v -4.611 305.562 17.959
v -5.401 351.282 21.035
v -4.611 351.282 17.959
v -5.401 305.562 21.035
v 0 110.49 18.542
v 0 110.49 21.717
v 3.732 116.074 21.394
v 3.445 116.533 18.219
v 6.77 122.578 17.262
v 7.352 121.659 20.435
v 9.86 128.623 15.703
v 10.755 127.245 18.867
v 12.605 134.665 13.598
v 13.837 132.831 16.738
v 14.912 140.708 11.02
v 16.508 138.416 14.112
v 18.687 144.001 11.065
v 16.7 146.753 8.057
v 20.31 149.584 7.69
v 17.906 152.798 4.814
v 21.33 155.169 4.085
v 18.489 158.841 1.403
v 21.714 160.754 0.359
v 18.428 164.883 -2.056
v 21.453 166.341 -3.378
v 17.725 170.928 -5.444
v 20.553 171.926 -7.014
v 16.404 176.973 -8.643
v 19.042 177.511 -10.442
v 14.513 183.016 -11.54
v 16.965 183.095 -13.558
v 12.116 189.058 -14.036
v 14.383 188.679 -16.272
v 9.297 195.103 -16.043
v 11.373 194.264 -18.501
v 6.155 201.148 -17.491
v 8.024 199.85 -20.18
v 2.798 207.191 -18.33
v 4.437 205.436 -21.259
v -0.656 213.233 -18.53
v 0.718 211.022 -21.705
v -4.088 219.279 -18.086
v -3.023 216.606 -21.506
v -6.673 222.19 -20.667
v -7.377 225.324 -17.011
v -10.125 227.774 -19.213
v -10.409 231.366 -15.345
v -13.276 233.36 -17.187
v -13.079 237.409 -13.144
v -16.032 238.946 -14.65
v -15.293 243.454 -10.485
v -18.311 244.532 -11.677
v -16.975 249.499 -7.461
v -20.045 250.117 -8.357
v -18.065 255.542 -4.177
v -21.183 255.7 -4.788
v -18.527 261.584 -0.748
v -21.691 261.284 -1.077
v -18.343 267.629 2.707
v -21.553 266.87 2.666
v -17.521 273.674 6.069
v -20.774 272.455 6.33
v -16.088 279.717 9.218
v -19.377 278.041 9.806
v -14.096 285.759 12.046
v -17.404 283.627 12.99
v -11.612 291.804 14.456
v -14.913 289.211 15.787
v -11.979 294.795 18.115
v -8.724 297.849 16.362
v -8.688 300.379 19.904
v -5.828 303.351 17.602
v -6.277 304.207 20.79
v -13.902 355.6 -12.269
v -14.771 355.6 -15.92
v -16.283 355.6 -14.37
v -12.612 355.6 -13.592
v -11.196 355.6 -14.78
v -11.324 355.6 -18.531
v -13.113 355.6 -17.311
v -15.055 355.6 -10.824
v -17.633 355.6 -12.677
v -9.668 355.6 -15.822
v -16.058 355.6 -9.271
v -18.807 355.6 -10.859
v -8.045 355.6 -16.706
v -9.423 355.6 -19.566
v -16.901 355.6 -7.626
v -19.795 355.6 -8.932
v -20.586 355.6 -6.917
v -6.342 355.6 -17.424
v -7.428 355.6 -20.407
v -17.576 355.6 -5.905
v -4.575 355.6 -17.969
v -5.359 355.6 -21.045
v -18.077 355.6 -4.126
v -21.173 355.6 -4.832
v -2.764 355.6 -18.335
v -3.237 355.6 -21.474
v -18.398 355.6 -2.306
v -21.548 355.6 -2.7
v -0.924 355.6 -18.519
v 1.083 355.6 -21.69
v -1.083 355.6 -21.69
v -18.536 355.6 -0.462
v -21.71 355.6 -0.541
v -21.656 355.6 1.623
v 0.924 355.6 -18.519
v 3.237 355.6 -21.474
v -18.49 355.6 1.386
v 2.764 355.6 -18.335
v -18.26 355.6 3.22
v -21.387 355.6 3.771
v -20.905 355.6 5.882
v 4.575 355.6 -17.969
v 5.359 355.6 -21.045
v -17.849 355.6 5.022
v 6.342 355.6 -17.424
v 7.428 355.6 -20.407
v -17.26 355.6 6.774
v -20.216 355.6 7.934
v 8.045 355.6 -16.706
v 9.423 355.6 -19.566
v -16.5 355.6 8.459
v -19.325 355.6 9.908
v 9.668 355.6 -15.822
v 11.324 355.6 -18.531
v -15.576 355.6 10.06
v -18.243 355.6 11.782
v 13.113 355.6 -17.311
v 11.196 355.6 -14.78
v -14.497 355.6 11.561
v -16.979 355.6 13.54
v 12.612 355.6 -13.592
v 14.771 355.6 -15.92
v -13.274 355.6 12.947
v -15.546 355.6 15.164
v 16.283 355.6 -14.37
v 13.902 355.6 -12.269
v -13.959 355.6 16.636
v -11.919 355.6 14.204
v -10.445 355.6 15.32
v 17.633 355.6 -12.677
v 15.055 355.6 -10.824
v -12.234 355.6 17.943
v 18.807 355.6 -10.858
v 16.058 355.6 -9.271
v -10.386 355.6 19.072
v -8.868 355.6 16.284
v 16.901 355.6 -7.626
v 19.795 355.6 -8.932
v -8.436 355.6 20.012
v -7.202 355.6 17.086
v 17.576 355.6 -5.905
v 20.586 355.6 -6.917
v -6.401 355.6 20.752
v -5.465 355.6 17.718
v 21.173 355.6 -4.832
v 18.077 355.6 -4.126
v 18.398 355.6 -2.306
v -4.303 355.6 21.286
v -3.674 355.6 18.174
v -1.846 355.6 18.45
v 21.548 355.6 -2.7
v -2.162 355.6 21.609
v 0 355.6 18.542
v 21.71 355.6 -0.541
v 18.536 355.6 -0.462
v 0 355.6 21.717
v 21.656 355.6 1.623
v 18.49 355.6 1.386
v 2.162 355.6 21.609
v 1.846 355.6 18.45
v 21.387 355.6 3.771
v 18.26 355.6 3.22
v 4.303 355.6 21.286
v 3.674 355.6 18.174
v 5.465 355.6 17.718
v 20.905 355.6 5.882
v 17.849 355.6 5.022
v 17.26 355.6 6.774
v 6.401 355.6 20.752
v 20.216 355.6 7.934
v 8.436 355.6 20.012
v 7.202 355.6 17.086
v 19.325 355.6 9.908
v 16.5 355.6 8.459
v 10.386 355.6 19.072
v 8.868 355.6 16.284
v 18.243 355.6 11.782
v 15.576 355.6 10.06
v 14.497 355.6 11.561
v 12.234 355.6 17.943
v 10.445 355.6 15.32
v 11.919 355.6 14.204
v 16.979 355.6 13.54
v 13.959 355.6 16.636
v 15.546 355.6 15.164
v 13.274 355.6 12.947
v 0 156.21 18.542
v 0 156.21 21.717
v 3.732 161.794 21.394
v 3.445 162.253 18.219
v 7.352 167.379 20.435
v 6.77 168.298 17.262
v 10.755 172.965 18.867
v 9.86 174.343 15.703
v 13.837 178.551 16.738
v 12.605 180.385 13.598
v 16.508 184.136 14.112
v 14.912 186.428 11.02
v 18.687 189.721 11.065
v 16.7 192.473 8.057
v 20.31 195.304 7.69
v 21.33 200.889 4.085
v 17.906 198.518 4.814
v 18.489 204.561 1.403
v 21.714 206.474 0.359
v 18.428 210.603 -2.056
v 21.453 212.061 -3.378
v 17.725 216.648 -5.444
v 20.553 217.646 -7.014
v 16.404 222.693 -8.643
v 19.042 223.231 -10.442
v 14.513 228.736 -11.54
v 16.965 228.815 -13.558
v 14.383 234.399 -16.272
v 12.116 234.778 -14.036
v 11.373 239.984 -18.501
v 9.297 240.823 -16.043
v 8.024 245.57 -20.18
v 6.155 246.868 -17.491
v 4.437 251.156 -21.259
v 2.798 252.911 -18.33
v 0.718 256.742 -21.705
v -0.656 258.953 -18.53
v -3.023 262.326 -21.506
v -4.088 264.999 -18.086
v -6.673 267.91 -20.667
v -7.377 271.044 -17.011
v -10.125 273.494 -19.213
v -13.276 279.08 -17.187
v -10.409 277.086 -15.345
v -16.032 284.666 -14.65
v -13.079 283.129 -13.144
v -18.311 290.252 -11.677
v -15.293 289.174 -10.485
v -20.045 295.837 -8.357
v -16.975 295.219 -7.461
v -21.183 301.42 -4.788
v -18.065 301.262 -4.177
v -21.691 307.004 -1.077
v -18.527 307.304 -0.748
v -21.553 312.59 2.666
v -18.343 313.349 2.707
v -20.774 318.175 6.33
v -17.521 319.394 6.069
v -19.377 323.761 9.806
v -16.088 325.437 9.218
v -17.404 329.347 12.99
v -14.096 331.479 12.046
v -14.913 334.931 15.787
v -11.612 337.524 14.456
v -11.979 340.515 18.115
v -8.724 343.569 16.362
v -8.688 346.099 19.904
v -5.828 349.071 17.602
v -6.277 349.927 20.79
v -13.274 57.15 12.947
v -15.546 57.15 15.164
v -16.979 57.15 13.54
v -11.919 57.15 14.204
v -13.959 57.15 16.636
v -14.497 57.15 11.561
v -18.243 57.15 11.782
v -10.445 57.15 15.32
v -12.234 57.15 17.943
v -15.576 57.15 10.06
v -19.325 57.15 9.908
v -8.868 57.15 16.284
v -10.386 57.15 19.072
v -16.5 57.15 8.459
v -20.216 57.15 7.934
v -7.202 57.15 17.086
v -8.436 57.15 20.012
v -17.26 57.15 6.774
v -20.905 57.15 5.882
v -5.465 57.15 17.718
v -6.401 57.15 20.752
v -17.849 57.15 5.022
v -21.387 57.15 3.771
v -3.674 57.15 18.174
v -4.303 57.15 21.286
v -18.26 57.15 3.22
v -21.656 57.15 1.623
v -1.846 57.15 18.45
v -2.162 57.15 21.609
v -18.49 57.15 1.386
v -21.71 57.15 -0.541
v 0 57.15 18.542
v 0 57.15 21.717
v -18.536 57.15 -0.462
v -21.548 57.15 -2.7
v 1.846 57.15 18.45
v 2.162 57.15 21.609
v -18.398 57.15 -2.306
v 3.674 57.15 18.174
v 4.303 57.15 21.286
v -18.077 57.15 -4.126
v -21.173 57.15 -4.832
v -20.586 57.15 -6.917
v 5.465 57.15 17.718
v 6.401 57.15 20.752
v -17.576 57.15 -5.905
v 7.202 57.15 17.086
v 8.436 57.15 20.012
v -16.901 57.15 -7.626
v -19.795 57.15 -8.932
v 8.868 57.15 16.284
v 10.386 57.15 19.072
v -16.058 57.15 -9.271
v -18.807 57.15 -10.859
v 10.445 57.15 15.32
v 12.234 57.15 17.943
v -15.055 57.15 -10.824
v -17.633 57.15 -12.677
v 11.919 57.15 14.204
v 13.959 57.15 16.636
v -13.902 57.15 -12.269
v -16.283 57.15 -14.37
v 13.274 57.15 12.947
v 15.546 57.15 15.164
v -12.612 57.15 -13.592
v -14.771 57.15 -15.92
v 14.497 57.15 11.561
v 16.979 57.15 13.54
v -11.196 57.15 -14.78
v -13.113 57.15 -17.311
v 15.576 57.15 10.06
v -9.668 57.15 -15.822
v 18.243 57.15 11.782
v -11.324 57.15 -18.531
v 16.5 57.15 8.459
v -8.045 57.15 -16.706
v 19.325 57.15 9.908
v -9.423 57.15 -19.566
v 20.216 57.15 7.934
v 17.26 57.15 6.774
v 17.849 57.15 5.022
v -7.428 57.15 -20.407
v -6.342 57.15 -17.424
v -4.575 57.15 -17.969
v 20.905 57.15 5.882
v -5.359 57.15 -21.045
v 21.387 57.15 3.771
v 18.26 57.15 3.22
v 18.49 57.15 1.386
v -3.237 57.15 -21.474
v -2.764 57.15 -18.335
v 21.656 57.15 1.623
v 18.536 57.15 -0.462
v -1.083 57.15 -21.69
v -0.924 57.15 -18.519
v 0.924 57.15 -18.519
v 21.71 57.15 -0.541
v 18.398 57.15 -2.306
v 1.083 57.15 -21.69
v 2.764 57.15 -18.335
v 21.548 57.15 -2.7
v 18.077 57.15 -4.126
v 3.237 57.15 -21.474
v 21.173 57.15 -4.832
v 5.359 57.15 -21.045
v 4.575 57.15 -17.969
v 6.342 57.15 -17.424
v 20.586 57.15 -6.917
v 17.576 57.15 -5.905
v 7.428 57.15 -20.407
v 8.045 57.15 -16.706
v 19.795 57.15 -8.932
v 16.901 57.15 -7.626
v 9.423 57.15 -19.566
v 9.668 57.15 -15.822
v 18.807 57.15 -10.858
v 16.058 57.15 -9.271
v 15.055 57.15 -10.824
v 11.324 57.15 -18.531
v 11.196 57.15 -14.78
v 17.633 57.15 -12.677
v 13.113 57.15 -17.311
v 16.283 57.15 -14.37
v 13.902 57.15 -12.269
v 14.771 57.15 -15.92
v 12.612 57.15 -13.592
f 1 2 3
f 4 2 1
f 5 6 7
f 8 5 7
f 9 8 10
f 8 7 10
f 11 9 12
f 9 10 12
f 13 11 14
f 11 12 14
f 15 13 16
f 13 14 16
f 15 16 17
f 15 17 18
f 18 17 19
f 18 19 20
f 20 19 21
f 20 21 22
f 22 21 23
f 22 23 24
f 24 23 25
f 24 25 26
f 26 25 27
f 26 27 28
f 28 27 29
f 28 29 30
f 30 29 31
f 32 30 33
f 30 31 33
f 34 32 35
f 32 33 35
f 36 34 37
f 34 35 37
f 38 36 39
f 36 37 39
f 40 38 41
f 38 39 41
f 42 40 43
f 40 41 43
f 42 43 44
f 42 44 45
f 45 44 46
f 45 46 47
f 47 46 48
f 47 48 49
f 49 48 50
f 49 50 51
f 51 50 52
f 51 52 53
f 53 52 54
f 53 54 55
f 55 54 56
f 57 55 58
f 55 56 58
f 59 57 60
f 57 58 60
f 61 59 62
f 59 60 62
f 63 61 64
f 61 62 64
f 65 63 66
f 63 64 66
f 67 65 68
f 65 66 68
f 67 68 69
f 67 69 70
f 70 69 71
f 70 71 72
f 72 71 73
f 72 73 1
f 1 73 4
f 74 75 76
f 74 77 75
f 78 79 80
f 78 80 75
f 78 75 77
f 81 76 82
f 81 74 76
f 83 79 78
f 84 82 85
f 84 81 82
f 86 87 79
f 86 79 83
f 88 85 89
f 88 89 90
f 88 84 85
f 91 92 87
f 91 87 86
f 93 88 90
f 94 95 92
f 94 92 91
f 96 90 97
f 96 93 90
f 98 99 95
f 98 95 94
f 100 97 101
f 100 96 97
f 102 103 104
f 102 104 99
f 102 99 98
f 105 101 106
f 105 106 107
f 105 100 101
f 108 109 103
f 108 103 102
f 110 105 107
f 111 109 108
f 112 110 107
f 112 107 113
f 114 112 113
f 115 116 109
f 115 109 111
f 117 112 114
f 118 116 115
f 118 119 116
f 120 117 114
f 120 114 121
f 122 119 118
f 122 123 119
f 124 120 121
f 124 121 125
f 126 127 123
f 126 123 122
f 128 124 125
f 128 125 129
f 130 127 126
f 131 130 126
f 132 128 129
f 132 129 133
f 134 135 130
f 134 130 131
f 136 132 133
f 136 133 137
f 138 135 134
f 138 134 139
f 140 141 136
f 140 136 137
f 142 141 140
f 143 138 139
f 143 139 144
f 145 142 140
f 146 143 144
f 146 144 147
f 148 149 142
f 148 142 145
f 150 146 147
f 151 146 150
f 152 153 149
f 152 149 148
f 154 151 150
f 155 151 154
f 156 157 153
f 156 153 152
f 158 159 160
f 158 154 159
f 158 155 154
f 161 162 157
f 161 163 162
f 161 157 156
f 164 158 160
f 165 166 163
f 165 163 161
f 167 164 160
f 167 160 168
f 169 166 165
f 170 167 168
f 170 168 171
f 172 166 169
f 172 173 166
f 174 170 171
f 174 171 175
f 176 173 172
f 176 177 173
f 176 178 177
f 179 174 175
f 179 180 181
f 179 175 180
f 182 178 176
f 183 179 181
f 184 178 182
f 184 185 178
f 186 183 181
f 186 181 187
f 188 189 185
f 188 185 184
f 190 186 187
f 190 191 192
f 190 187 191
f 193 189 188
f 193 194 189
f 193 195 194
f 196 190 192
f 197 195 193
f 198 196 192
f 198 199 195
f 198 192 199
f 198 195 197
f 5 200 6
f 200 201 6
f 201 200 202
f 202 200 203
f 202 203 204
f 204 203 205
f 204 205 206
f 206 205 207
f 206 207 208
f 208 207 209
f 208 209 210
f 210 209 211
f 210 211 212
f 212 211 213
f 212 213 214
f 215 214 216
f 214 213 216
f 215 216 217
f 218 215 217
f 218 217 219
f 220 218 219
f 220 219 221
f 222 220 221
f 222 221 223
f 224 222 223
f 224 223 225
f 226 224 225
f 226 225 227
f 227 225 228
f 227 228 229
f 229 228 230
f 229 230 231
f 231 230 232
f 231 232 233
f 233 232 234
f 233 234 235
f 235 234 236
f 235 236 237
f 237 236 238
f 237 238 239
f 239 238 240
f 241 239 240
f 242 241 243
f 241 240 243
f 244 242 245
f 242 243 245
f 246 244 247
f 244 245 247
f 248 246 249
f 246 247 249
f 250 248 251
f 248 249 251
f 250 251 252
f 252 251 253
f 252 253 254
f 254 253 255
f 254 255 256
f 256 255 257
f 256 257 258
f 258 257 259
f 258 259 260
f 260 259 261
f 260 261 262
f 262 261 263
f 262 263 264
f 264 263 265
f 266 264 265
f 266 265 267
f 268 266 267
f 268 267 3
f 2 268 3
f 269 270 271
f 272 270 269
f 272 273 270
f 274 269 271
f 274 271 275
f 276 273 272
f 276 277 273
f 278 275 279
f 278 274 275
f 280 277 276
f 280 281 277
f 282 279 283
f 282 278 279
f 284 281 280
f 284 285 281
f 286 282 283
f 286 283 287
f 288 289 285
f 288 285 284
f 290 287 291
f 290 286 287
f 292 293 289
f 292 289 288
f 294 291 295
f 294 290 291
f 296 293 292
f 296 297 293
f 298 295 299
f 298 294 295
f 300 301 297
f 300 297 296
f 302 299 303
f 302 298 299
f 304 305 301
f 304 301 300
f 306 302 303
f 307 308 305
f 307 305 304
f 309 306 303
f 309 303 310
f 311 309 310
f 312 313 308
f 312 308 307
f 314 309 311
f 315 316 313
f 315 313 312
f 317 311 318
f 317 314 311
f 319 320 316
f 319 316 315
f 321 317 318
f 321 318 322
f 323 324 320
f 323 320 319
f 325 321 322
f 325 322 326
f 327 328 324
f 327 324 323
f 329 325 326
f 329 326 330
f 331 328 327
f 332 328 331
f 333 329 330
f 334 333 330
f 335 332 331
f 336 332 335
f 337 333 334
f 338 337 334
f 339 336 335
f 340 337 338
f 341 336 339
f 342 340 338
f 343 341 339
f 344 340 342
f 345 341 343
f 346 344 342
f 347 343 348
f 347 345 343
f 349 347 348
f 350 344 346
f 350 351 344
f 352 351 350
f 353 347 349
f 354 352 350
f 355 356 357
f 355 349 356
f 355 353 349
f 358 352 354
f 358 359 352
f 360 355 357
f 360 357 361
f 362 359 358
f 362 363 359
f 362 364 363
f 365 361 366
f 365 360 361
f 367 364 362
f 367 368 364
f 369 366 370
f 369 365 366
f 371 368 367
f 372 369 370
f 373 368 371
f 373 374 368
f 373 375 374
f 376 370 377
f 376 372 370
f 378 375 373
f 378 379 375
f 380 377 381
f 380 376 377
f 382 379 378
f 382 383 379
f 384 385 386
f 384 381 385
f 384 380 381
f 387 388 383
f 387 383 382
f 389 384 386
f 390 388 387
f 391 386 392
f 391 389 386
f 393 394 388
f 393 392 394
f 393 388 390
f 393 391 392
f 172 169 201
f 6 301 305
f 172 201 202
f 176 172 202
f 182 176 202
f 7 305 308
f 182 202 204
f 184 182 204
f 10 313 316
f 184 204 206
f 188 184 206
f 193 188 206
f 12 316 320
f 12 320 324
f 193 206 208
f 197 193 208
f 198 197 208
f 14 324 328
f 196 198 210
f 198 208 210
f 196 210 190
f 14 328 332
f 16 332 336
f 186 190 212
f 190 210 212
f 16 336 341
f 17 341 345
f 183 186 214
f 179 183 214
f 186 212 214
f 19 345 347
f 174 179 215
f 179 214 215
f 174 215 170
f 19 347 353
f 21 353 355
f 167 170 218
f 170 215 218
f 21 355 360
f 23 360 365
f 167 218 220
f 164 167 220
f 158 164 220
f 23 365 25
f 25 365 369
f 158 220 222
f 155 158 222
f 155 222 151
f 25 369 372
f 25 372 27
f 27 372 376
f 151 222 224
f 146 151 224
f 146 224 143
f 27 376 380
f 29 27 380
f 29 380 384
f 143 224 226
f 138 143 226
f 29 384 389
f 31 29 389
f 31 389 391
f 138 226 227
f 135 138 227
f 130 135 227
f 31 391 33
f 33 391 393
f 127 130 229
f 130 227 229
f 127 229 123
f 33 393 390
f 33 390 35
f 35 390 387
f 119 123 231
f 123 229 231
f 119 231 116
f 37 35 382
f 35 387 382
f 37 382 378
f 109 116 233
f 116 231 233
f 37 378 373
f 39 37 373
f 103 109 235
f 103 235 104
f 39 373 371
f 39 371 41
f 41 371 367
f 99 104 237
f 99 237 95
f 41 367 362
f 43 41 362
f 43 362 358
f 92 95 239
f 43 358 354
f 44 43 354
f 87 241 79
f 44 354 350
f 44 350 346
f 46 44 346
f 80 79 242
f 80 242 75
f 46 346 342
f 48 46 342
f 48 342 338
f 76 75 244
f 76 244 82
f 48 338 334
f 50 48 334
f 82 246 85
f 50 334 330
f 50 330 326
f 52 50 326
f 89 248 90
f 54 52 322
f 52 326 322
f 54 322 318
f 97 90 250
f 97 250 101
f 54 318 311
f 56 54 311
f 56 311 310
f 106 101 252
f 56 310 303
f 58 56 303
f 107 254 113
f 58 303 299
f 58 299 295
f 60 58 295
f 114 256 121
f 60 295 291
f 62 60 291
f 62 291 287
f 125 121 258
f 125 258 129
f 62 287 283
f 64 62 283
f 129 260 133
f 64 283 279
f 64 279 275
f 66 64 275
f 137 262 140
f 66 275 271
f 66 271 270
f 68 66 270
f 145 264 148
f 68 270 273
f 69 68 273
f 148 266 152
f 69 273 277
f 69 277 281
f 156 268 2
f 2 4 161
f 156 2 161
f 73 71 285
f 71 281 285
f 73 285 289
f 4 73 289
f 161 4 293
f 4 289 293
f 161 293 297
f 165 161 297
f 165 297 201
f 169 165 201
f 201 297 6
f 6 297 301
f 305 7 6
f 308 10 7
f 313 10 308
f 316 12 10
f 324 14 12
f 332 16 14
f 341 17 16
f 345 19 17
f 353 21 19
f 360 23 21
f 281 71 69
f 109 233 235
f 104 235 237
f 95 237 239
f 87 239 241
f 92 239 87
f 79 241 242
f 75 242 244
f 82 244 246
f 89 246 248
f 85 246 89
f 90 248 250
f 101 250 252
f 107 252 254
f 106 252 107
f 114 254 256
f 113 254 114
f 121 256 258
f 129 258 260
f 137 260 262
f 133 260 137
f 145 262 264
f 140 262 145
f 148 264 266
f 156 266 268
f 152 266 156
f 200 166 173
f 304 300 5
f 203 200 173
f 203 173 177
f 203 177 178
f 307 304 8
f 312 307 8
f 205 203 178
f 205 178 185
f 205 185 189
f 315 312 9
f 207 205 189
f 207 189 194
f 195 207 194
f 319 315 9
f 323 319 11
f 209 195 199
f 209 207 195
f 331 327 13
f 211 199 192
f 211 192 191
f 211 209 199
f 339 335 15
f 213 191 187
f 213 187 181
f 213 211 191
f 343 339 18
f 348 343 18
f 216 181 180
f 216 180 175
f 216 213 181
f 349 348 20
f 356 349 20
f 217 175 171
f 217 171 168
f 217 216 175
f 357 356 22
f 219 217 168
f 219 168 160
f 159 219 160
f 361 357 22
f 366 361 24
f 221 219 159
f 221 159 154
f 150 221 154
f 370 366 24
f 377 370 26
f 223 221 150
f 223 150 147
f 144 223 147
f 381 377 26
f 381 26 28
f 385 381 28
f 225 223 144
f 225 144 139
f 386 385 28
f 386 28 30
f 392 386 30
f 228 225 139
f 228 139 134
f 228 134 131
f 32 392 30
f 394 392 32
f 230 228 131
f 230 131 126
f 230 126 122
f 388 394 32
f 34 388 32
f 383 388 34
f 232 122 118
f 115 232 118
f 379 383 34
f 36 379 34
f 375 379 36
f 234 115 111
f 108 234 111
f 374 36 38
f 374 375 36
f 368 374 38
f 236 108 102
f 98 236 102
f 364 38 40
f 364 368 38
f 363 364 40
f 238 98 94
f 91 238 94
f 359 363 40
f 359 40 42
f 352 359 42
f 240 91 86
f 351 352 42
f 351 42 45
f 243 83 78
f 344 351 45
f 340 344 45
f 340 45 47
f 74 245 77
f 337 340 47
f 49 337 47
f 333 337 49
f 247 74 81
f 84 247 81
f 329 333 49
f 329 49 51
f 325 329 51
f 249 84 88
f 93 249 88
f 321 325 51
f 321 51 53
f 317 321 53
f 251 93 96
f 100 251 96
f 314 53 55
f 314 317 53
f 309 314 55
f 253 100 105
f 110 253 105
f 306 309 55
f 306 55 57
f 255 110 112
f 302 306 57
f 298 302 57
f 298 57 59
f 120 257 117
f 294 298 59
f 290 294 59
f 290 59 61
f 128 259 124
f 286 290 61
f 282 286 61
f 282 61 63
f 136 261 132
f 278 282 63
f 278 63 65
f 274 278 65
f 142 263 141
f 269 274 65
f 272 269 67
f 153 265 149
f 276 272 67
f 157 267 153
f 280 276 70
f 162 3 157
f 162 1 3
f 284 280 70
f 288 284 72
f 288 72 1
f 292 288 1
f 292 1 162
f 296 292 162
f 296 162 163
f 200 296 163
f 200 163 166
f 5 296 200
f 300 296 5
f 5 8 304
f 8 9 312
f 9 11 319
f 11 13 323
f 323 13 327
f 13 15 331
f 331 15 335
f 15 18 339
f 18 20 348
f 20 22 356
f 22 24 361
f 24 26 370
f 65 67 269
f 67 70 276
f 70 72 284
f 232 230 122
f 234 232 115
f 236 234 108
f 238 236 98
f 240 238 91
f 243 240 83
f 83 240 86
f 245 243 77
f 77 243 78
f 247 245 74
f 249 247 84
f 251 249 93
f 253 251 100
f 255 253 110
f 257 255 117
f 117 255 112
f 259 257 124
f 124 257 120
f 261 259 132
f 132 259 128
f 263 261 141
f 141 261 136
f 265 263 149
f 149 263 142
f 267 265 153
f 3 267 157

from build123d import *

# Parameters (mm, degrees)
SKETCH1_R           = 21.717
SKETCH1_R_2         = 18.542
BOSS_EXTRUDE1_DEPTH = 355.6
CUT_SWEEP1_PITCH    = 203.2
SKETCH17_R          = 21.717
CUT_EXTRUDE3_DEPTH  = 57.15


with BuildPart() as part:
    # Sketch1 → Boss-Extrude1 (new body)
    with BuildSketch(Plane(origin=(0, 0, 0), x_dir=(1, 0, 0), z_dir=(0, 1, 0))):
        with Locations(Location((0, 0, 0), (0, 0, 270))):
            Circle(SKETCH1_R)
        with Locations(Location((0, 0, 0), (0, 0, 270))):
            Circle(SKETCH1_R_2, mode=Mode.SUBTRACT)
    extrude(amount=BOSS_EXTRUDE1_DEPTH)

    # Cut-Sweep1: the profile of Sketch6 profile screwed along a right-hand helix of 0.96 turns, 42 arcs to a turn; built about Z, then put on its axis
    cut_sweep1_z = Axis((0, 0, 0), (0, 0, 1))
    cut_sweep1_corners = [(18.542, 0, -22.86), (21.7173, 0, -22.86), (21.7173, 0, 22.86), (18.542, 0, 22.86)]
    with BuildLine(mode=Mode.PRIVATE) as cut_sweep1_profile:
        Line(cut_sweep1_corners[0], cut_sweep1_corners[1])
        Line(cut_sweep1_corners[1], cut_sweep1_corners[2])
        Line(cut_sweep1_corners[2], cut_sweep1_corners[3])
        Line(cut_sweep1_corners[3], cut_sweep1_corners[0])
    cut_sweep1_cap = Face(cut_sweep1_profile.wire())
    cut_sweep1_turn_angles = [0, 4.285714286, 8.571428571, 12.857142857, 17.142857143, 21.428571429, 25.714285714, 30, 34.285714286, 38.571428571, 42.857142857, 47.142857143, 51.428571429, 55.714285714, 60, 64.285714286, 68.571428571, 72.857142857, 77.142857143, 81.428571429, 85.714285714, 90, 94.285714286, 98.571428571, 102.857142857, 107.142857143, 111.428571429, 115.714285714, 120, 124.285714286, 128.571428571, 132.857142857, 137.142857143, 141.428571429, 145.714285714, 150, 154.285714286, 158.571428571, 162.857142857, 167.142857143, 171.428571429, 175.714285714, 180, 184.285714286, 188.571428571, 192.857142857, 197.142857143, 201.428571429, 205.714285714, 210, 214.285714286, 218.571428571, 222.857142857, 227.142857143, 231.428571429, 235.714285714, 240, 244.285714286, 248.571428571, 252.857142857, 257.142857143, 261.428571429, 265.714285714, 270, 274.285714286, 278.571428571, 282.857142857, 287.142857143, 291.428571429, 295.714285714, 300, 304.285714286, 308.571428571, 312.857142857, 317.142857143, 321.428571429, 325.714285714, 330, 334.285714286, 338.571428571, 342.857142857, 344.228571429, 345.6]
    cut_sweep1_turn_weights = [1, 0.9972037971811801, 1, 0.9972037971811801, 1, 0.9972037971811801, 1, 0.9972037971811801, 1, 0.9972037971811801, 1, 0.9972037971811801, 1, 0.9972037971811801, 1, 0.9972037971811801, 1, 0.9972037971811801, 1, 0.9972037971811801, 1, 0.9972037971811801, 1, 0.9972037971811801, 1, 0.9972037971811801, 1, 0.9972037971811801, 1, 0.9972037971811801, 1, 0.9972037971811801, 1, 0.9972037971811801, 1, 0.9972037971811801, 1, 0.9972037971811801, 1, 0.9972037971811801, 1, 0.9972037971811801, 1, 0.9972037971811801, 1, 0.9972037971811801, 1, 0.9972037971811801, 1, 0.9972037971811801, 1, 0.9972037971811801, 1, 0.9972037971811801, 1, 0.9972037971811801, 1, 0.9972037971811801, 1, 0.9972037971811801, 1, 0.9972037971811801, 1, 0.9972037971811801, 1, 0.9972037971811801, 1, 0.9972037971811801, 1, 0.9972037971811801, 1, 0.9972037971811801, 1, 0.9972037971811801, 1, 0.9972037971811801, 1, 0.9972037971811801, 1, 0.9972037971811801, 1, 0.9997135489685032, 1]
    cut_sweep1_turn_rails = [Edge.make_bspline([Vector(p[0], p[1], 0).rotate(cut_sweep1_z, cut_sweep1_turn_angles[k]) / cut_sweep1_turn_weights[k] + Vector(0, 0, p[2] + CUT_SWEEP1_PITCH * cut_sweep1_turn_angles[k] / 360) for k in range(83)], [0, 0, 0, 1, 1, 2, 2, 3, 3, 4, 4, 5, 5, 6, 6, 7, 7, 8, 8, 9, 9, 10, 10, 11, 11, 12, 12, 13, 13, 14, 14, 15, 15, 16, 16, 17, 17, 18, 18, 19, 19, 20, 20, 21, 21, 22, 22, 23, 23, 24, 24, 25, 25, 26, 26, 27, 27, 28, 28, 29, 29, 30, 30, 31, 31, 32, 32, 33, 33, 34, 34, 35, 35, 36, 36, 37, 37, 38, 38, 39, 39, 40, 40, 41, 41, 41], 2, cut_sweep1_turn_weights) for p in cut_sweep1_corners]
    cut_sweep1_turn_sides = [Face.make_surface_from_curves(cut_sweep1_turn_rails[p[0]], cut_sweep1_turn_rails[p[1]]) for p in [(0, 1), (1, 2), (2, 3), (3, 0)]]
    cut_sweep1 = Plane(origin=(0, 133.35, 0), x_dir=(0, 0, 1), z_dir=(0, 1, 0)) * Solid(Shell([*cut_sweep1_turn_sides, cut_sweep1_cap, cut_sweep1_cap.rotate(cut_sweep1_z, 345.6).moved(Location((0, 0, CUT_SWEEP1_PITCH * 345.6 / 360)))]))
    add(cut_sweep1, mode=Mode.SUBTRACT)

    # Sketch17 → Cut-Extrude3 (cut)
    with BuildSketch(Plane.XZ):
        with Locations(Location((0, 0, 0), (0, 0, 270))):
            Circle(SKETCH17_R)
    extrude(amount=-CUT_EXTRUDE3_DEPTH, mode=Mode.SUBTRACT)


solid = part.part
